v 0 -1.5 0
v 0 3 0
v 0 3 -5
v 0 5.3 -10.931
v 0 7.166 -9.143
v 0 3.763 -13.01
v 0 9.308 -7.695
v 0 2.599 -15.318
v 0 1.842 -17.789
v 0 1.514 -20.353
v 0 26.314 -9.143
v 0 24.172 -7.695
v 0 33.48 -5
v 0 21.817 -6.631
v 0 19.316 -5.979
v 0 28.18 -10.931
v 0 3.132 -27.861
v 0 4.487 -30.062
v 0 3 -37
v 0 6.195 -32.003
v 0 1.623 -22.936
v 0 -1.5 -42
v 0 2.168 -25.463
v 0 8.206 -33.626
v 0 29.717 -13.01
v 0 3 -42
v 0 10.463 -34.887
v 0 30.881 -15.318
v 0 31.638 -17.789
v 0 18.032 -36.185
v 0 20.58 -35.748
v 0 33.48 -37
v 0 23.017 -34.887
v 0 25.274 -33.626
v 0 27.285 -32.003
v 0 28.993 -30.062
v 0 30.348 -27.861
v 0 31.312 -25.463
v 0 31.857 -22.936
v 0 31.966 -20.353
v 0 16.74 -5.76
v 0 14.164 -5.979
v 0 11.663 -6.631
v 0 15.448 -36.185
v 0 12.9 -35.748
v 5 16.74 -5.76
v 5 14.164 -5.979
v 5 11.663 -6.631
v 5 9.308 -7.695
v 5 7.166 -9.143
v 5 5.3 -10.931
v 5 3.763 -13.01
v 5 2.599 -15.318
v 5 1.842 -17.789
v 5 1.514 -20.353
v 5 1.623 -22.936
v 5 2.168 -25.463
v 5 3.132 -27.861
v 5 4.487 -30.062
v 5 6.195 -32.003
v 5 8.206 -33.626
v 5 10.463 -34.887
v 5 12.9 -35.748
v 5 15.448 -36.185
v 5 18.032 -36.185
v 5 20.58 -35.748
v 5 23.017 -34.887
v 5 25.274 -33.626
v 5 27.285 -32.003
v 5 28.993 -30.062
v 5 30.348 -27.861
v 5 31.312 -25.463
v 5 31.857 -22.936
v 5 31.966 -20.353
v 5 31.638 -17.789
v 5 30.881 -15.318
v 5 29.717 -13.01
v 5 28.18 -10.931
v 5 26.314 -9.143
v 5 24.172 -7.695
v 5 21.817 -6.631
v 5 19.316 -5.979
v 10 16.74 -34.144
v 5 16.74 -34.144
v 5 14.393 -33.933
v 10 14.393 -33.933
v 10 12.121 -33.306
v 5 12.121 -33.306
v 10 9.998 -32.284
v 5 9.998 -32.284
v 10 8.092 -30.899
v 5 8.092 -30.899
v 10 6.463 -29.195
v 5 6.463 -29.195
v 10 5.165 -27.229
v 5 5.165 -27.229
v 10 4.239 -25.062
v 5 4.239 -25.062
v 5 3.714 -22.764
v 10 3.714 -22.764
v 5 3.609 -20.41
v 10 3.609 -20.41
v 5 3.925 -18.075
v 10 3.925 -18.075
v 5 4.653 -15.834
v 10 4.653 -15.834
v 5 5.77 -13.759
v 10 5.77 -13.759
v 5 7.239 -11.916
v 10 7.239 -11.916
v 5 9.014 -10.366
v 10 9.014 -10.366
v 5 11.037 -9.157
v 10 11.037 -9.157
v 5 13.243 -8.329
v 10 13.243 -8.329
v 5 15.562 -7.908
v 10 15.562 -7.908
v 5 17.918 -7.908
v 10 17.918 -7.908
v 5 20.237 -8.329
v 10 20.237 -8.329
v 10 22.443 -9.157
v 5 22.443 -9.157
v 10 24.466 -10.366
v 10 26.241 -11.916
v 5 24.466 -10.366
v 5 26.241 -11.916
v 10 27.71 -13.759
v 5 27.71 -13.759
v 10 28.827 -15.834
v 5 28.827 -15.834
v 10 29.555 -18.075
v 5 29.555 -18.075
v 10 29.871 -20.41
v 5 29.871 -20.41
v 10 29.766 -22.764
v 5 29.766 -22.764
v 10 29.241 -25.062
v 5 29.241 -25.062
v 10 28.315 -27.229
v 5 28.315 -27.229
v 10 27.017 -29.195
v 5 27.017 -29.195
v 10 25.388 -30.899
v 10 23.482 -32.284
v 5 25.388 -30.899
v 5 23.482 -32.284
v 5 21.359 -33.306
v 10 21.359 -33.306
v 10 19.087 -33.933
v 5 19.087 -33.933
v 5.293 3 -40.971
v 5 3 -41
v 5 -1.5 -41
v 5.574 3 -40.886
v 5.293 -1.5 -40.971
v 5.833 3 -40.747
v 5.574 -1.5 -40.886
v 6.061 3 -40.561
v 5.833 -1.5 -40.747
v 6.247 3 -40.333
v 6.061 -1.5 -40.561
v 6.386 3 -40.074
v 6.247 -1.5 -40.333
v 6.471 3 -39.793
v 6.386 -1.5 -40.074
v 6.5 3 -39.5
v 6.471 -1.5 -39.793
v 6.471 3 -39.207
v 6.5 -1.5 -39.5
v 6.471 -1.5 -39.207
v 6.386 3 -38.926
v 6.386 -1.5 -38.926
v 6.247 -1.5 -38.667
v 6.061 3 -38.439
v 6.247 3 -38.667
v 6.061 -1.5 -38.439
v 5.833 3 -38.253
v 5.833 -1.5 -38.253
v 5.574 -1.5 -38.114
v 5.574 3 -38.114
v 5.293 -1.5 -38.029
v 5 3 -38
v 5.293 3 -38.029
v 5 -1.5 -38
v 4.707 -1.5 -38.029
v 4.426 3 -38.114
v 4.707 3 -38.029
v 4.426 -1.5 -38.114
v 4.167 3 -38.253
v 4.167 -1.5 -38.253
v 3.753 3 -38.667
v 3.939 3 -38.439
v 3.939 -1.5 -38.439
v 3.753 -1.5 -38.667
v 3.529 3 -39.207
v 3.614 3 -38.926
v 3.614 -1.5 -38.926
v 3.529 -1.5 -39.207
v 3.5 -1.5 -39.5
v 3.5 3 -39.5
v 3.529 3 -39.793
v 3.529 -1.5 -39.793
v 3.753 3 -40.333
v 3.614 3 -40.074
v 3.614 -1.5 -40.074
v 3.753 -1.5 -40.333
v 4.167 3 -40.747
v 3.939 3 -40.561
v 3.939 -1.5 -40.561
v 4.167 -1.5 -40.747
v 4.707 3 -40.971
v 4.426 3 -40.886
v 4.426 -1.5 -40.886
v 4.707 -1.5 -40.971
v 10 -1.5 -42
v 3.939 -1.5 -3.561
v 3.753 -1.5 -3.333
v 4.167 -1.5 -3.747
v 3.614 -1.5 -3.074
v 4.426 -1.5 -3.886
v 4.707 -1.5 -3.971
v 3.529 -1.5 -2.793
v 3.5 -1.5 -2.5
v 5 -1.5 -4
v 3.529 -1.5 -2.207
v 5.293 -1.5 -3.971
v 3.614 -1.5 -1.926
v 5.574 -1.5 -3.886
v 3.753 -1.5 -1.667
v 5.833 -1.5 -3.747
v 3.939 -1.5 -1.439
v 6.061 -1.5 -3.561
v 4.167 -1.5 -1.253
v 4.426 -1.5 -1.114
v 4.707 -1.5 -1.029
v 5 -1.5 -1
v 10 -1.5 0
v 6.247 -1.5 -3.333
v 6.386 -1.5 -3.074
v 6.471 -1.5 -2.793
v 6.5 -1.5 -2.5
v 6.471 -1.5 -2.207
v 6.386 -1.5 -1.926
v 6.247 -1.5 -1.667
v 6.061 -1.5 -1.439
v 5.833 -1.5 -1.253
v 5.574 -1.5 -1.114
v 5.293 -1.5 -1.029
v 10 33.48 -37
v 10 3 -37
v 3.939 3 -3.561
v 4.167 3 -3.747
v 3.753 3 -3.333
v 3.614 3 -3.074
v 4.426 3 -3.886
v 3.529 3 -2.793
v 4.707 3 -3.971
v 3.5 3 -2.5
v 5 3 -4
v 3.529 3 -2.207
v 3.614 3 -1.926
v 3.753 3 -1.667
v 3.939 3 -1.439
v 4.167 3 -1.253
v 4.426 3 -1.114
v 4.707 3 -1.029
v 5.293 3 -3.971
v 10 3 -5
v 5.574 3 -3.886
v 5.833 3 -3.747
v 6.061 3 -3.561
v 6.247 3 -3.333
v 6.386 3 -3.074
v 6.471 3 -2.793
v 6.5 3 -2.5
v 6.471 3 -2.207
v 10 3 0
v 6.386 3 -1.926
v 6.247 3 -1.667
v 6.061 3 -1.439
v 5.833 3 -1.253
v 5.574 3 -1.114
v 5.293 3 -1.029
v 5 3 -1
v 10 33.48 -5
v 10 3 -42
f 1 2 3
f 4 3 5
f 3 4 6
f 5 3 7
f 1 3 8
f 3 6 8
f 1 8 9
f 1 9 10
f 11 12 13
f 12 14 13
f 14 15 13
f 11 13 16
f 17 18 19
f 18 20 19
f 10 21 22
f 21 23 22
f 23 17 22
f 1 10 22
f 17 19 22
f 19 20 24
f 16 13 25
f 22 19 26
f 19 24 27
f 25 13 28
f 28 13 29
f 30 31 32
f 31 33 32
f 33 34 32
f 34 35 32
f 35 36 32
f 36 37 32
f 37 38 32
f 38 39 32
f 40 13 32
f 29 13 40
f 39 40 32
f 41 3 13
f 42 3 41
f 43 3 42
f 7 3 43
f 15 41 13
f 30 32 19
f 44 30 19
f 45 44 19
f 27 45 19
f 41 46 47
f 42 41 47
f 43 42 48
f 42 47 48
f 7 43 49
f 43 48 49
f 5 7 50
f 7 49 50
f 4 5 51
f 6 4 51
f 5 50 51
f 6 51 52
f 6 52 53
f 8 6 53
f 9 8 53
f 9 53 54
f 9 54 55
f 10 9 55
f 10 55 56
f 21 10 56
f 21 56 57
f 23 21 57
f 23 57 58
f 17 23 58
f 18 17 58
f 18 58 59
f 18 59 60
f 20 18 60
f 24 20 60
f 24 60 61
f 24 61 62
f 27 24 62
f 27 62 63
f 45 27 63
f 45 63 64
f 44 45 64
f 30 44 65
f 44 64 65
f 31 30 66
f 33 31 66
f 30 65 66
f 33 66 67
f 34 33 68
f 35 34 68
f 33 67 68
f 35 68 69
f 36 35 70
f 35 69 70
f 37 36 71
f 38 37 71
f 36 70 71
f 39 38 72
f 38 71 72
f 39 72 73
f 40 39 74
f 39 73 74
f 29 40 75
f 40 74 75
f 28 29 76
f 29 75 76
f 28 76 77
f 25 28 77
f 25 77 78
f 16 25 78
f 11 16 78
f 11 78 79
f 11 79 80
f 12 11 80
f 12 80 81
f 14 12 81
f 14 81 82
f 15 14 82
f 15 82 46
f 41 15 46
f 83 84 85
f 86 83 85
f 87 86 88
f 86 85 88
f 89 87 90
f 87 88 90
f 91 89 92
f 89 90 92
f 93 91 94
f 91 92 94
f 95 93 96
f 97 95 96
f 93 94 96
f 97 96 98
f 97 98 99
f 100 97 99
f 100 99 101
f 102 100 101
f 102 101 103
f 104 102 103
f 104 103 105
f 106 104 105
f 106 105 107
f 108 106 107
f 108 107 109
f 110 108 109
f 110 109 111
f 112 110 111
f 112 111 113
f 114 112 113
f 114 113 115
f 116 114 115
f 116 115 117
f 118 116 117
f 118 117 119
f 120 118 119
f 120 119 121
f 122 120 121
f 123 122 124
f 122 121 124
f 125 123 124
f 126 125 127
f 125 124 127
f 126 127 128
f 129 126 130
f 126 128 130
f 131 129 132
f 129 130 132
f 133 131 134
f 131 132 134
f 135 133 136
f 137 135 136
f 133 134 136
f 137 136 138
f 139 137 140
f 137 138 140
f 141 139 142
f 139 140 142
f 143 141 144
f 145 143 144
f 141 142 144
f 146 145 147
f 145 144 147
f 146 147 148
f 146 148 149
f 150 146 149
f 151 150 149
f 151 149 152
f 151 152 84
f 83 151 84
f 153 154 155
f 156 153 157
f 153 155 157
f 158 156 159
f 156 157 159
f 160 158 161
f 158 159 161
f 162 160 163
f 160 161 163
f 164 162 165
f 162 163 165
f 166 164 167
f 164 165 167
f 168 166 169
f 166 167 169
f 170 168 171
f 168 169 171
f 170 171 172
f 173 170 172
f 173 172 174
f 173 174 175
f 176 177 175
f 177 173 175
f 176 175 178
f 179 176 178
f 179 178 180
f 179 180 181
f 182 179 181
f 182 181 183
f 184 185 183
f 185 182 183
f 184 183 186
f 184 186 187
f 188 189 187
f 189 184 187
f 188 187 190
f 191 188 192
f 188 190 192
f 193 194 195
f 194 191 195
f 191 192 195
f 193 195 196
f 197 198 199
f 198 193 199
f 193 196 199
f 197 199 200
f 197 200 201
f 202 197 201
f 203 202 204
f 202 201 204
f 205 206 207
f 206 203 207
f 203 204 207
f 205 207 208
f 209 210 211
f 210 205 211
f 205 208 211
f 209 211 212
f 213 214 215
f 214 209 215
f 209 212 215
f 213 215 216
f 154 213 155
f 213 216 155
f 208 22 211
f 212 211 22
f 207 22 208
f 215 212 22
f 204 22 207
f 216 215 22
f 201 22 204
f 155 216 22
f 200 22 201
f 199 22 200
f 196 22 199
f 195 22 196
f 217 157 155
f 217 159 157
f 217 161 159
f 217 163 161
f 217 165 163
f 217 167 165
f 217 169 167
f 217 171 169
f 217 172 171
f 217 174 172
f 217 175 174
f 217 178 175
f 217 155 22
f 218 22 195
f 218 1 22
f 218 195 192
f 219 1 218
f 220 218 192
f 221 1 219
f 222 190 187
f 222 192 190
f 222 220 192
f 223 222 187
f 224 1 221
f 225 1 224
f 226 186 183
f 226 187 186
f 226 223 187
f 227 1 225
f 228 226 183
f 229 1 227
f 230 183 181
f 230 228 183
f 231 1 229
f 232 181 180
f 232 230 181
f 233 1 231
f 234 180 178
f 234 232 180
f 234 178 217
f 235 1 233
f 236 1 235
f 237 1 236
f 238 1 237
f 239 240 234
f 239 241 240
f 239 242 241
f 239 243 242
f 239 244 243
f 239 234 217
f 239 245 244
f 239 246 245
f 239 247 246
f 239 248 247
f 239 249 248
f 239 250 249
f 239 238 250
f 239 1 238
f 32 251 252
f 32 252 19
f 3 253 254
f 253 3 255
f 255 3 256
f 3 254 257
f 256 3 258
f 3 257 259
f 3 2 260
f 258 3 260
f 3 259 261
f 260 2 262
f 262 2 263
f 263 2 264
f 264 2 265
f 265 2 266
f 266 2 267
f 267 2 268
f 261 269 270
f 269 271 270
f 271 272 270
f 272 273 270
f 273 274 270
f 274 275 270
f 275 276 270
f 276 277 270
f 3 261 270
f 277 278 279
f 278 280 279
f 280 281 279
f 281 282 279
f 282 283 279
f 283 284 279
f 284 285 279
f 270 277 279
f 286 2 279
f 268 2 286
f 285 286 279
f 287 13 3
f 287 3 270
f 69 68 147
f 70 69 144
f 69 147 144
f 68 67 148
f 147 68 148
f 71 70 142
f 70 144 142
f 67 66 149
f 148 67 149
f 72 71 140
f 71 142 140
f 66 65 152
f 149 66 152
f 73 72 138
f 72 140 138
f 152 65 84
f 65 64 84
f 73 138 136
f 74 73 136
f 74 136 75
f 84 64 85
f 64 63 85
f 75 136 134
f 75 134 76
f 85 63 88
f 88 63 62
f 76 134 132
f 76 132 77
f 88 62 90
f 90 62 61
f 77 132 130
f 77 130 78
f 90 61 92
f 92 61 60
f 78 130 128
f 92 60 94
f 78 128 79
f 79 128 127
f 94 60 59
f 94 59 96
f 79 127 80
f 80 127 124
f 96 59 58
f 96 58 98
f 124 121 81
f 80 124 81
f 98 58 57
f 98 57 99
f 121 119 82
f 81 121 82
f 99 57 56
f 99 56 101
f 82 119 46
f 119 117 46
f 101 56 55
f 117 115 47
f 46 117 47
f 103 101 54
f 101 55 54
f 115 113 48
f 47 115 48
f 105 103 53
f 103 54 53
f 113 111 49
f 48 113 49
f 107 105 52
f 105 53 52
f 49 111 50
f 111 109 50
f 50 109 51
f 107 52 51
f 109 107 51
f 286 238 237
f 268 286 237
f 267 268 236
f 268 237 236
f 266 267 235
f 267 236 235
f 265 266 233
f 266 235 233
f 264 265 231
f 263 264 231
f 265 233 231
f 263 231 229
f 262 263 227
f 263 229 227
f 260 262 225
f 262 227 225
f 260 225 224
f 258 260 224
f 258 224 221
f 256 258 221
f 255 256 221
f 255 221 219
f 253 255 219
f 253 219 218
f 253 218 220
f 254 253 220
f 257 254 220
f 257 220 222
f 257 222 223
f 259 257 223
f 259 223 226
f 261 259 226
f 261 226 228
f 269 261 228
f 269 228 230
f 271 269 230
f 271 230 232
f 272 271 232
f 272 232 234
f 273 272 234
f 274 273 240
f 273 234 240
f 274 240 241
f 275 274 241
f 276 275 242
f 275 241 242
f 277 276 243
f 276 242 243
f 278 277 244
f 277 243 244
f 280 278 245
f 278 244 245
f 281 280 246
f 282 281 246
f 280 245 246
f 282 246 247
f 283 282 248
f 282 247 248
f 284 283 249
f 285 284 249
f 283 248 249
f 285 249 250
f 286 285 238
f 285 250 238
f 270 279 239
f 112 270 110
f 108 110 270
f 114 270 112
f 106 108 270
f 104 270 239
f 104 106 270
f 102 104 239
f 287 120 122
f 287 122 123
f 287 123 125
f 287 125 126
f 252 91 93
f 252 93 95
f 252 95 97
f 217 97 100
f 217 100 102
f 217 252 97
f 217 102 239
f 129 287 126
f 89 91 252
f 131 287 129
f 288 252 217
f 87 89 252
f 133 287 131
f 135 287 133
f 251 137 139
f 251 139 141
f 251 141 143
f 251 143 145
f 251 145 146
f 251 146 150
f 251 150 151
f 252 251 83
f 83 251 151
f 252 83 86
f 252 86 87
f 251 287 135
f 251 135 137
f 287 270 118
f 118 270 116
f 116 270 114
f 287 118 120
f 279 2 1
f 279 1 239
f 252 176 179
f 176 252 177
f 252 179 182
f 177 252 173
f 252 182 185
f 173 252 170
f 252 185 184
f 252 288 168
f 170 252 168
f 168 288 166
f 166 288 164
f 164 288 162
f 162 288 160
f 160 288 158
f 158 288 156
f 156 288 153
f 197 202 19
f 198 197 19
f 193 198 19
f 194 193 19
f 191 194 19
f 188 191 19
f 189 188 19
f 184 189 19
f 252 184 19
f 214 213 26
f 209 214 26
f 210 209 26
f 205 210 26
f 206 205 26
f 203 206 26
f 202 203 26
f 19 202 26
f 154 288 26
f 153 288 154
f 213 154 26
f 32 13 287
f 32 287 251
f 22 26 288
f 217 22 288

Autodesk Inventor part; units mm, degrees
ref_plane "YZ Plane" through (0, 0, 0) normal (1, 0, 0) x (0, 1, 0)
ref_plane "XZ Plane" through (0, 0, 0) normal (0, 1, 0) x (-1, 0, 0)
sketch "Sketch1" plane through (0, 0, 0) normal (1, 0, 0) x (0, 1, 0)
  line L0 (0, 0) -> (33.48, 0)
  line L1 (33.48, 0) -> (33.48, -42)
  line L2 (33.48, -42) -> (0, -42)
  line L3 (0, -42) -> (0, 0)
  point P0 (33.48, -21)
  point P1 (16.74, 0)
  dimension "d0" = 33.48
  dimension "d1" = 42
extrude "Extrusion1" add sketch "Sketch1" along normal blind 10
sketch "Sketch2" plane through (10, 0, 0) normal (1, 0, 0) x (0, 0, -1)
  line L0 (0, 33.48) -> (0, 0) projected
  line L1 (42, 33.48) -> (0, 33.48) projected
  point P0 (21, 16.74)
  point P1 (0, 16.74)
  point P2 (21, 33.48)
hole "Hole1" at (10, 16.74, -21) direction (-1, 0, 0) diameter 26.289 depth 66.675 tip angle 118
sketch "Sketch3" plane through (0, 0, 0) normal (0, 0, 1) x (1, 0, 0)
  line L0 (0, 0) -> (0, 33.48) projected
  line L1 (0, 33.48) -> (10, 33.48) projected
  line L2 (0, 3) -> (10, 3)
  line L3 (10, 3) -> (10, 33.48)
  line L4 (10, 33.48) -> (0, 33.48)
  line L5 (0, 33.48) -> (0, 3)
  line L6 (0, 0) -> (10, 0) projected
  dimension "d12" = 3
extrude "Extrusion2" cut sketch "Sketch3" against normal blind 5
sketch "Sketch6" plane through (0, 0, -42) normal (0, -1, 0) x (1, 0, 0)
  line L0 (0, 42) -> (0, 0) projected
  line L1 (0, 0) -> (10, 0) projected
  line L2 (0, 42) -> (10, 42)
  line L3 (10, 42) -> (10, 0)
  line L4 (10, 0) -> (0, 0)
  line L5 (0, 0) -> (0, 42)
extrude "Extrusion3" add sketch "Sketch6" along normal blind 1.5
ref_plane "Work Plane1" through (0, 0, -21) normal (0, 0, 1) x (1, 0, 0)
sketch "Sketch4" plane through (0, 3, 0) normal (0, 1, 0) x (1, 0, 0)
  line L0 (10, 5) -> (10, 0) projected
  line L1 (10, 0) -> (0, 0) projected
  point P0 (5, 2.5)
  point P1 (10, 2.5)
  point P2 (5, 0)
hole "Hole2" at (5, 3, -2.5) direction (0, -1, 0) diameter 3 end through all
mirror "Mirror1" about plane through (0, 0, -21) normal (0, 0, 1) of "Hole2", "Extrusion2"
sketch "Sketch5" plane through (0, 0, 0) normal (-1, 0, 0) x (0, 0, 1)
  circle A0 centre (-21, 16.74) radius 13.1445 projected
  point P0 (0, 0)
hole "Hole3" at (0, 16.74, -21) direction (1, 0, 0) diameter 30.48 depth 5
properties part number "Laser holder3" material "Aluminum 6061"
